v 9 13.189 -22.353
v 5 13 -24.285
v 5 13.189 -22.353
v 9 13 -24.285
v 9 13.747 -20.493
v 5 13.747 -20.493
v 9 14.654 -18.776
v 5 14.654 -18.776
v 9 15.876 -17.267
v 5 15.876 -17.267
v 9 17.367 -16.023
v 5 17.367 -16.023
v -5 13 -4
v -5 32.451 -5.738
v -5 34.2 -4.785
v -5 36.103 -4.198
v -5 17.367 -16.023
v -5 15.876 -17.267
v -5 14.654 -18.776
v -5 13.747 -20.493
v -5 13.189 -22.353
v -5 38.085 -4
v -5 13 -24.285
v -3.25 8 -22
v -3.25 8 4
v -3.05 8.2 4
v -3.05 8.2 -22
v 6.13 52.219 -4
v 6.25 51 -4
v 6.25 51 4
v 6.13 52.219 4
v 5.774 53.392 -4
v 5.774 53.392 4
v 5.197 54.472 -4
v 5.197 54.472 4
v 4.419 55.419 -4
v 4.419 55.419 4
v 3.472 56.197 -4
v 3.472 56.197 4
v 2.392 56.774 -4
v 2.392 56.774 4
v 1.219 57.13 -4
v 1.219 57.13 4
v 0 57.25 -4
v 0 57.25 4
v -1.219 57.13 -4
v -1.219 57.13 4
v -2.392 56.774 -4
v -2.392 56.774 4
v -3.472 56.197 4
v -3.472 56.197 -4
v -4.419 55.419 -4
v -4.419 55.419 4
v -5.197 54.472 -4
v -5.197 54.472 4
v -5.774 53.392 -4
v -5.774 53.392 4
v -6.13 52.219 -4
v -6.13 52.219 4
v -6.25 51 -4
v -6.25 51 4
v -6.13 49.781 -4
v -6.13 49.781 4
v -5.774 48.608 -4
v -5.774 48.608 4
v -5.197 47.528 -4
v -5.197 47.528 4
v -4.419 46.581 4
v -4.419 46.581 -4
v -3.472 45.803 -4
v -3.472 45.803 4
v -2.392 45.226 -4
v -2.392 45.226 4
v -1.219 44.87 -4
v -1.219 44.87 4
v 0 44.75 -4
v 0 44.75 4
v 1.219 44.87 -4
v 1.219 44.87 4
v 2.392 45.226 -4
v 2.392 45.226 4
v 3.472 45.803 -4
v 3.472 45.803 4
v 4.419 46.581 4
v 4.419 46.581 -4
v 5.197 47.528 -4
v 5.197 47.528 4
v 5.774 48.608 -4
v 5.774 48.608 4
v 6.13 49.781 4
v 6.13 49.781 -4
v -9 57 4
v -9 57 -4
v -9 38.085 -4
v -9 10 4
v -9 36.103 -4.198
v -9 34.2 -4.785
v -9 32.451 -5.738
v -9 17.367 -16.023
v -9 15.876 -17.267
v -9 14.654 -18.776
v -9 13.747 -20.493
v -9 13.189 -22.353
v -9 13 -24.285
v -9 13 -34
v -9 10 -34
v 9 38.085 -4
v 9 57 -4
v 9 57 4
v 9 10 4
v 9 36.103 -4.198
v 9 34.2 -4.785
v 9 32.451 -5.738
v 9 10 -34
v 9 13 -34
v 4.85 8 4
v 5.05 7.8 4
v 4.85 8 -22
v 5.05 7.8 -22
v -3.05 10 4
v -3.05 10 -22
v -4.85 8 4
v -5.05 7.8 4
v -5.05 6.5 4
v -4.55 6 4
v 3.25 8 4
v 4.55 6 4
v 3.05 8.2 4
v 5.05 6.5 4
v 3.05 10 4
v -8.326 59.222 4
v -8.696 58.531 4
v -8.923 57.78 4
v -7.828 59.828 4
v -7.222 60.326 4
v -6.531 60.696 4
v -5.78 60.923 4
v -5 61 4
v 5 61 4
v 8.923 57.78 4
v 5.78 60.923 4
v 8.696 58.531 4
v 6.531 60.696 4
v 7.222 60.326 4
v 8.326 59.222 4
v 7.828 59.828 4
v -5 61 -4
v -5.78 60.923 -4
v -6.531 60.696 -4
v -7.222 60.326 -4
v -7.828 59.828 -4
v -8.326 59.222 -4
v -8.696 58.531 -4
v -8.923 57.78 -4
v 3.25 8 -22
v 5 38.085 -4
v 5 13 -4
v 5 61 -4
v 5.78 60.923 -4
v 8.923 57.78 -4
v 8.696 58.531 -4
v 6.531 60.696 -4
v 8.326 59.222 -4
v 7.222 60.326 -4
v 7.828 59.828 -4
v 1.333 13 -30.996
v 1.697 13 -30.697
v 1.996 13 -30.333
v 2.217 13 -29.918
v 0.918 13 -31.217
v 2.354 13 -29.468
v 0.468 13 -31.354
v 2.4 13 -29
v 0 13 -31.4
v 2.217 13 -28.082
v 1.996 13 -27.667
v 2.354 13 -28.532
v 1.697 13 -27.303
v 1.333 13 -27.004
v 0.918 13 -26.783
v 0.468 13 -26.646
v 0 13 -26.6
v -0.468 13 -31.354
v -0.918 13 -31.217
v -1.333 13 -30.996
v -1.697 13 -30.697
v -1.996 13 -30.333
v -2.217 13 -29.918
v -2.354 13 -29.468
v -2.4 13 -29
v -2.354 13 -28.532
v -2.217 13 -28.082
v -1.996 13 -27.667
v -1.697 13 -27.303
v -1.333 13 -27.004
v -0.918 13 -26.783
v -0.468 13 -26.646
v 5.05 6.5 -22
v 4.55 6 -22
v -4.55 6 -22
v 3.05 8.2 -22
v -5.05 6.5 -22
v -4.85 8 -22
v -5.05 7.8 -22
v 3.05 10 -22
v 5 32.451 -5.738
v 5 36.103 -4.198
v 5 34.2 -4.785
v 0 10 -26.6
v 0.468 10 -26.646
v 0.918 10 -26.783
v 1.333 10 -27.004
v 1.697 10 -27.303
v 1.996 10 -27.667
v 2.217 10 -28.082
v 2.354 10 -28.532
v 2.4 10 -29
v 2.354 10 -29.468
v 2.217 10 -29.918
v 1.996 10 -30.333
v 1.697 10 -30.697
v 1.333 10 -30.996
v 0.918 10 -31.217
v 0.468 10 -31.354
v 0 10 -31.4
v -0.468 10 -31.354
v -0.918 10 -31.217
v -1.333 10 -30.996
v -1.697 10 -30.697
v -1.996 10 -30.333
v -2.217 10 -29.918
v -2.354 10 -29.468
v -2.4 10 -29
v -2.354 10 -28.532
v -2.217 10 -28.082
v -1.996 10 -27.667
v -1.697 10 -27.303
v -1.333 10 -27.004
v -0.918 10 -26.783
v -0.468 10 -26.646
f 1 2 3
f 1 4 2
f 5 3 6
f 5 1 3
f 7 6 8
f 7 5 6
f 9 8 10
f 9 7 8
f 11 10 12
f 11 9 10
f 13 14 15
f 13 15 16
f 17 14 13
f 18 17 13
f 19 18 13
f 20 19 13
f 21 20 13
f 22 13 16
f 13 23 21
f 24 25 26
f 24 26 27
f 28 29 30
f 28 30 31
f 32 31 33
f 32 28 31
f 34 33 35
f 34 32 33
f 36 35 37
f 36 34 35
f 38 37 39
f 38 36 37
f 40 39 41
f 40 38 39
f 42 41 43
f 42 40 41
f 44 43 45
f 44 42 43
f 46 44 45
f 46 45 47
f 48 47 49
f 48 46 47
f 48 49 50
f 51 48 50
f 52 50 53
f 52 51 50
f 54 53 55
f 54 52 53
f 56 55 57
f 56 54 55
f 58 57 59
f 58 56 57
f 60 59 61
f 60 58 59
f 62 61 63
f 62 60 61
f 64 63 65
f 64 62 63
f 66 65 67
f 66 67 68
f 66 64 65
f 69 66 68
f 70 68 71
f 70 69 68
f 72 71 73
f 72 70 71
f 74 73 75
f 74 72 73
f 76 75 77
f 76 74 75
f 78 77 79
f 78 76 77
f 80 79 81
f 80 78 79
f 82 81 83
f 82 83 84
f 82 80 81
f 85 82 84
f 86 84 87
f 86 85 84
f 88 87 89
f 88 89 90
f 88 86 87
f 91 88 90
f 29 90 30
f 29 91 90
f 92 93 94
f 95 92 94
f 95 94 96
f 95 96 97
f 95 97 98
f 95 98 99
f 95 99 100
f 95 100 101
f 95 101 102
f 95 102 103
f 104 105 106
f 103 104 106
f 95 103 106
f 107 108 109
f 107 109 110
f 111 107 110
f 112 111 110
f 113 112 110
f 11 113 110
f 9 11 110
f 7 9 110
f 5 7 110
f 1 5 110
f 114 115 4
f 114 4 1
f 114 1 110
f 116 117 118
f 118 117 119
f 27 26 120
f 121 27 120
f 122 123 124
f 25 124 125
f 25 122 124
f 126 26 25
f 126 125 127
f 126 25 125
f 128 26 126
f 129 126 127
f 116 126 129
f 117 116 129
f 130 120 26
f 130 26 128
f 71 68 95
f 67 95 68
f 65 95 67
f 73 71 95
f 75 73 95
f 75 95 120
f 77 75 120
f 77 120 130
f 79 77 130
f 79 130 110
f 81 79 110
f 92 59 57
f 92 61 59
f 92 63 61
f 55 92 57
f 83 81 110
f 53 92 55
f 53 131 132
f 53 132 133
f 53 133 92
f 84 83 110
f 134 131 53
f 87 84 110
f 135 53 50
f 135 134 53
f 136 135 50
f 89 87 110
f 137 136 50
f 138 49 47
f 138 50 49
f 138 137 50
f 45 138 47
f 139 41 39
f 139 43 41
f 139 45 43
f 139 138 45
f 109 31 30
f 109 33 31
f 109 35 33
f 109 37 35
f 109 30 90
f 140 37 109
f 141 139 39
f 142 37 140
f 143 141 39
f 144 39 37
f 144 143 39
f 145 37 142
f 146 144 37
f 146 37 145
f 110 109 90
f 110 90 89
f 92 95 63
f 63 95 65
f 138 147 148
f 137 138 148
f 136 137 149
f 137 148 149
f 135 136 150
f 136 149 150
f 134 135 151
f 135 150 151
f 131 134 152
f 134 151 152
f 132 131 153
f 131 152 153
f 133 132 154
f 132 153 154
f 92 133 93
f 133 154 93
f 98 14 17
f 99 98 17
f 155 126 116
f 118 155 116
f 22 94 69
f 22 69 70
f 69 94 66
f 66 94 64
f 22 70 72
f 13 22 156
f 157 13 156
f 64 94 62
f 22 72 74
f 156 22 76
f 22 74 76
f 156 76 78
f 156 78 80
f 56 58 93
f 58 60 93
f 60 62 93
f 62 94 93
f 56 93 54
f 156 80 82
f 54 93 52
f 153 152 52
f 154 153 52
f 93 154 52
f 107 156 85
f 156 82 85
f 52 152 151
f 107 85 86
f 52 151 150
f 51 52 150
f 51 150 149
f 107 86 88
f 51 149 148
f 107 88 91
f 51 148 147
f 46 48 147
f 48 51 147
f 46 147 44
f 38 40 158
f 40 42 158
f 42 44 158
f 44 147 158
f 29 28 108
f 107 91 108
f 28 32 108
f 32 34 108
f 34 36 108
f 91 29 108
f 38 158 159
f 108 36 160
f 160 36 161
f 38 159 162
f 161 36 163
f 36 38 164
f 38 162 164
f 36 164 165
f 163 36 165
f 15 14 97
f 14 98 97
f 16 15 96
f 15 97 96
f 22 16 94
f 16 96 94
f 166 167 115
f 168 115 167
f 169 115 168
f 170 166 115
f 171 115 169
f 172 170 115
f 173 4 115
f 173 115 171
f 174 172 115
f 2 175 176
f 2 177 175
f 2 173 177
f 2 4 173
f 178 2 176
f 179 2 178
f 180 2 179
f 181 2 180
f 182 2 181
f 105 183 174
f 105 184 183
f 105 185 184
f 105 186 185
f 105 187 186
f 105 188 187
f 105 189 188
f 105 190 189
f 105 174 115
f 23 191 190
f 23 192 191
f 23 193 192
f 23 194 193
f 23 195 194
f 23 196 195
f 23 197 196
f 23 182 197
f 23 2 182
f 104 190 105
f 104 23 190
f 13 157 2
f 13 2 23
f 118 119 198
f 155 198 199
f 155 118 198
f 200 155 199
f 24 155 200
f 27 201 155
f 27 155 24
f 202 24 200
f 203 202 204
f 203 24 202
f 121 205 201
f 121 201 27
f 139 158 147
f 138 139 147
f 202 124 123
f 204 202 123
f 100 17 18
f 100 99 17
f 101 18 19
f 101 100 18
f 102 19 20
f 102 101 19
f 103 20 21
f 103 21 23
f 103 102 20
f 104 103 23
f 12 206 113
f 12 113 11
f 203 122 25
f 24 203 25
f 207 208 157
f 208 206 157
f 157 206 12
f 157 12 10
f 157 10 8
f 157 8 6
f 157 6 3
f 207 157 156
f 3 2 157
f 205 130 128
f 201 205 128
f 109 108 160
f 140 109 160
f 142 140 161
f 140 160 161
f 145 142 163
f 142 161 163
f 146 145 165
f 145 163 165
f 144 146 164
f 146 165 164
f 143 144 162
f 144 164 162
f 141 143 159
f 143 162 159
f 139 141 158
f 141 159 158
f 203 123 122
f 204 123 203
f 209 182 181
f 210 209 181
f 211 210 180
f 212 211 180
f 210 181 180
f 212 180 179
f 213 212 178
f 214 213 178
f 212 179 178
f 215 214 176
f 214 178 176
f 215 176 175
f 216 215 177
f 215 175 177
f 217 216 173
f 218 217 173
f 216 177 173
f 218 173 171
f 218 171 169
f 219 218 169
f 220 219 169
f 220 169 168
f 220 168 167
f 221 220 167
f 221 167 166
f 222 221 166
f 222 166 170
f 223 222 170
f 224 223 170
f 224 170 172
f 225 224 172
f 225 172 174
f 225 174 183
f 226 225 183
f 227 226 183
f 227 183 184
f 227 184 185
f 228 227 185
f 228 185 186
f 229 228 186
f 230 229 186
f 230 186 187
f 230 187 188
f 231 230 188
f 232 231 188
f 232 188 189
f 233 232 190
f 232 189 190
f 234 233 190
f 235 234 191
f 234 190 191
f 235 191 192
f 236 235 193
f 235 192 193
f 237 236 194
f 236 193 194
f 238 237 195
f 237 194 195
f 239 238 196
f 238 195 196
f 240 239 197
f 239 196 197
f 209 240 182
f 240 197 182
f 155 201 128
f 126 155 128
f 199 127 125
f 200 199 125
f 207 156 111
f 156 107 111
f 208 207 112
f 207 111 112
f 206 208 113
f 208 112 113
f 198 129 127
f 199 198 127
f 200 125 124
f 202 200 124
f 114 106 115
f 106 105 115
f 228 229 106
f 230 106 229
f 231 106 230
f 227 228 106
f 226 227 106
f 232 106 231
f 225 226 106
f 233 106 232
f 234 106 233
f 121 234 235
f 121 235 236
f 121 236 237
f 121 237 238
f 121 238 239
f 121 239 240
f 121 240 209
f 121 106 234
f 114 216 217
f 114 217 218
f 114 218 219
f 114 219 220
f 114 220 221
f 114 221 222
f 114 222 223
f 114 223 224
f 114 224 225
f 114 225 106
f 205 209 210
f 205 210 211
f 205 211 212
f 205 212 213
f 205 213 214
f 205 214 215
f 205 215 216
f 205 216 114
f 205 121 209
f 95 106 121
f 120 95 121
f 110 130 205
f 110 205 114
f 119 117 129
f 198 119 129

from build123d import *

# Parameters (mm, degrees)
EXTRUDE_1_DEPTH      = 4
EXTRUDE_1_DEPTH_BACK = 4
SKETCH_1_R           = 6.25
EXTRUDE_2_DEPTH      = 34
RIB_1_REACH          = 74.118
SKETCH_2_WALL_W      = 172.862971768
SKETCH_2_WALL_H      = 4
FILLET_1_R           = 10
EXTRUDE_3_DEPTH      = 22
CHAMFER_1_SIZE       = 0.2
SKETCH_4_R           = 2.4
CUT_EXTRUDE_1_DEPTH  = 60.506302187


with BuildPart() as part:
    # 草图1 → 凸台-拉伸1 (new, two sides: drawn at the far end of the back side and taken through both)
    # profile 1 of 3: a face of its own
    with BuildSketch(Plane.XY.offset(-EXTRUDE_1_DEPTH_BACK)):
        Polygon((-9, 10), (-3.05, 10), (3.05, 10), (9, 10), (9, 13), (-9, 13), align=None)
    # profile 2 of 3: a face of its own
    with BuildSketch(Plane.XY.offset(-EXTRUDE_1_DEPTH_BACK)):
        Polygon((3.05, 10), (-3.05, 10), (-3.05, 8), (-5.05, 8), (-5.05, 6.5), (-4.55, 6), (4.55, 6), (5.05, 6.5), (5.05, 8), (3.05, 8), align=None)
    # profile 3 of 3: a face of its own
    with BuildSketch(Plane.XY.offset(-EXTRUDE_1_DEPTH_BACK)):
        with BuildLine():
            Line((-9, 57), (-9, 13))
            Line((-9, 13), (9, 13))
            Line((9, 13), (9, 57))
            ThreePointArc((9, 57), (7.828427125, 59.828427125), (5, 61))
            Line((5, 61), (-5, 61))
            ThreePointArc((-5, 61), (-7.828427125, 59.828427125), (-9, 57))
        make_face()
        with Locations((0, 51)):
            Circle(SKETCH_1_R, mode=Mode.SUBTRACT)
    extrude(amount=EXTRUDE_1_DEPTH + EXTRUDE_1_DEPTH_BACK)

    # 草图1<6> → 凸台-拉伸2 (add)
    with BuildSketch(Plane.XY):
        Polygon((-9, 10), (-3.05, 10), (3.05, 10), (9, 10), (9, 13), (-9, 13), align=None)
    extrude(amount=-EXTRUDE_2_DEPTH)

    # 草图2 wall → 筋1 (add, up to next)
    with BuildSketch(Plane(origin=(9, 24, -11.5), x_dir=(0, -0.826227342808, -0.563336824642), z_dir=(0, 0.563336824642, -0.826227342808)), mode=Mode.PRIVATE) as rib_1_sk1:
        with Locations((0, 2)):
            Rectangle(SKETCH_2_WALL_W, SKETCH_2_WALL_H)
    rib_1_tool1 = extrude(rib_1_sk1.sketch, amount=-RIB_1_REACH, mode=Mode.PRIVATE) - part.part
    rib_1 = rib_1_tool1.solids().sort_by_distance((9, 24, -11.5))[0]
    add(rib_1)

    # 镜向1: 筋1 across plane
    add(rib_1.mirror(Plane(origin=(0, 0, 0), x_dir=(0, 0, 1), z_dir=(1, 0, 0))))

    # 圆角1
    fillet_1_edges = [part.edges().sort_by_distance(p)[0] for p in [
        (7, 13, -19),
        (7, 35, -4),
        (-7, 13, -19),
        (-7, 35, -4),
    ]]
    fillet(fillet_1_edges, radius=FILLET_1_R)

    # 草图1<7> → 凸台-拉伸3 (add)
    with BuildSketch(Plane.XY):
        Polygon((3.05, 8), (5.05, 8), (5.05, 6.5), (4.55, 6), (-4.55, 6), (-5.05, 6.5), (-5.05, 8), (-3.05, 8), (-3.05, 10), (3.05, 10), align=None)
    extrude(amount=-EXTRUDE_3_DEPTH)

    # 倒角1
    chamfer_1_edges = [part.edges().sort_by_distance(p)[0] for p in [
        (5.05, 8, -9),
        (-5.05, 8, -9),
        (-3.05, 8, -9),
        (3.05, 8, -9),
    ]]
    chamfer(chamfer_1_edges, length=CHAMFER_1_SIZE)

    # 草图4 → 切除-拉伸1 (cut, through all)
    with BuildSketch(Plane(origin=(0, 13, 0), x_dir=(1, 0, 0), z_dir=(0, 1, 0))):
        with Locations(Location((0, 29, 0), (0, 0, 270))):
            Circle(SKETCH_4_R)
    extrude(amount=-CUT_EXTRUDE_1_DEPTH, mode=Mode.SUBTRACT)


solid = part.part
